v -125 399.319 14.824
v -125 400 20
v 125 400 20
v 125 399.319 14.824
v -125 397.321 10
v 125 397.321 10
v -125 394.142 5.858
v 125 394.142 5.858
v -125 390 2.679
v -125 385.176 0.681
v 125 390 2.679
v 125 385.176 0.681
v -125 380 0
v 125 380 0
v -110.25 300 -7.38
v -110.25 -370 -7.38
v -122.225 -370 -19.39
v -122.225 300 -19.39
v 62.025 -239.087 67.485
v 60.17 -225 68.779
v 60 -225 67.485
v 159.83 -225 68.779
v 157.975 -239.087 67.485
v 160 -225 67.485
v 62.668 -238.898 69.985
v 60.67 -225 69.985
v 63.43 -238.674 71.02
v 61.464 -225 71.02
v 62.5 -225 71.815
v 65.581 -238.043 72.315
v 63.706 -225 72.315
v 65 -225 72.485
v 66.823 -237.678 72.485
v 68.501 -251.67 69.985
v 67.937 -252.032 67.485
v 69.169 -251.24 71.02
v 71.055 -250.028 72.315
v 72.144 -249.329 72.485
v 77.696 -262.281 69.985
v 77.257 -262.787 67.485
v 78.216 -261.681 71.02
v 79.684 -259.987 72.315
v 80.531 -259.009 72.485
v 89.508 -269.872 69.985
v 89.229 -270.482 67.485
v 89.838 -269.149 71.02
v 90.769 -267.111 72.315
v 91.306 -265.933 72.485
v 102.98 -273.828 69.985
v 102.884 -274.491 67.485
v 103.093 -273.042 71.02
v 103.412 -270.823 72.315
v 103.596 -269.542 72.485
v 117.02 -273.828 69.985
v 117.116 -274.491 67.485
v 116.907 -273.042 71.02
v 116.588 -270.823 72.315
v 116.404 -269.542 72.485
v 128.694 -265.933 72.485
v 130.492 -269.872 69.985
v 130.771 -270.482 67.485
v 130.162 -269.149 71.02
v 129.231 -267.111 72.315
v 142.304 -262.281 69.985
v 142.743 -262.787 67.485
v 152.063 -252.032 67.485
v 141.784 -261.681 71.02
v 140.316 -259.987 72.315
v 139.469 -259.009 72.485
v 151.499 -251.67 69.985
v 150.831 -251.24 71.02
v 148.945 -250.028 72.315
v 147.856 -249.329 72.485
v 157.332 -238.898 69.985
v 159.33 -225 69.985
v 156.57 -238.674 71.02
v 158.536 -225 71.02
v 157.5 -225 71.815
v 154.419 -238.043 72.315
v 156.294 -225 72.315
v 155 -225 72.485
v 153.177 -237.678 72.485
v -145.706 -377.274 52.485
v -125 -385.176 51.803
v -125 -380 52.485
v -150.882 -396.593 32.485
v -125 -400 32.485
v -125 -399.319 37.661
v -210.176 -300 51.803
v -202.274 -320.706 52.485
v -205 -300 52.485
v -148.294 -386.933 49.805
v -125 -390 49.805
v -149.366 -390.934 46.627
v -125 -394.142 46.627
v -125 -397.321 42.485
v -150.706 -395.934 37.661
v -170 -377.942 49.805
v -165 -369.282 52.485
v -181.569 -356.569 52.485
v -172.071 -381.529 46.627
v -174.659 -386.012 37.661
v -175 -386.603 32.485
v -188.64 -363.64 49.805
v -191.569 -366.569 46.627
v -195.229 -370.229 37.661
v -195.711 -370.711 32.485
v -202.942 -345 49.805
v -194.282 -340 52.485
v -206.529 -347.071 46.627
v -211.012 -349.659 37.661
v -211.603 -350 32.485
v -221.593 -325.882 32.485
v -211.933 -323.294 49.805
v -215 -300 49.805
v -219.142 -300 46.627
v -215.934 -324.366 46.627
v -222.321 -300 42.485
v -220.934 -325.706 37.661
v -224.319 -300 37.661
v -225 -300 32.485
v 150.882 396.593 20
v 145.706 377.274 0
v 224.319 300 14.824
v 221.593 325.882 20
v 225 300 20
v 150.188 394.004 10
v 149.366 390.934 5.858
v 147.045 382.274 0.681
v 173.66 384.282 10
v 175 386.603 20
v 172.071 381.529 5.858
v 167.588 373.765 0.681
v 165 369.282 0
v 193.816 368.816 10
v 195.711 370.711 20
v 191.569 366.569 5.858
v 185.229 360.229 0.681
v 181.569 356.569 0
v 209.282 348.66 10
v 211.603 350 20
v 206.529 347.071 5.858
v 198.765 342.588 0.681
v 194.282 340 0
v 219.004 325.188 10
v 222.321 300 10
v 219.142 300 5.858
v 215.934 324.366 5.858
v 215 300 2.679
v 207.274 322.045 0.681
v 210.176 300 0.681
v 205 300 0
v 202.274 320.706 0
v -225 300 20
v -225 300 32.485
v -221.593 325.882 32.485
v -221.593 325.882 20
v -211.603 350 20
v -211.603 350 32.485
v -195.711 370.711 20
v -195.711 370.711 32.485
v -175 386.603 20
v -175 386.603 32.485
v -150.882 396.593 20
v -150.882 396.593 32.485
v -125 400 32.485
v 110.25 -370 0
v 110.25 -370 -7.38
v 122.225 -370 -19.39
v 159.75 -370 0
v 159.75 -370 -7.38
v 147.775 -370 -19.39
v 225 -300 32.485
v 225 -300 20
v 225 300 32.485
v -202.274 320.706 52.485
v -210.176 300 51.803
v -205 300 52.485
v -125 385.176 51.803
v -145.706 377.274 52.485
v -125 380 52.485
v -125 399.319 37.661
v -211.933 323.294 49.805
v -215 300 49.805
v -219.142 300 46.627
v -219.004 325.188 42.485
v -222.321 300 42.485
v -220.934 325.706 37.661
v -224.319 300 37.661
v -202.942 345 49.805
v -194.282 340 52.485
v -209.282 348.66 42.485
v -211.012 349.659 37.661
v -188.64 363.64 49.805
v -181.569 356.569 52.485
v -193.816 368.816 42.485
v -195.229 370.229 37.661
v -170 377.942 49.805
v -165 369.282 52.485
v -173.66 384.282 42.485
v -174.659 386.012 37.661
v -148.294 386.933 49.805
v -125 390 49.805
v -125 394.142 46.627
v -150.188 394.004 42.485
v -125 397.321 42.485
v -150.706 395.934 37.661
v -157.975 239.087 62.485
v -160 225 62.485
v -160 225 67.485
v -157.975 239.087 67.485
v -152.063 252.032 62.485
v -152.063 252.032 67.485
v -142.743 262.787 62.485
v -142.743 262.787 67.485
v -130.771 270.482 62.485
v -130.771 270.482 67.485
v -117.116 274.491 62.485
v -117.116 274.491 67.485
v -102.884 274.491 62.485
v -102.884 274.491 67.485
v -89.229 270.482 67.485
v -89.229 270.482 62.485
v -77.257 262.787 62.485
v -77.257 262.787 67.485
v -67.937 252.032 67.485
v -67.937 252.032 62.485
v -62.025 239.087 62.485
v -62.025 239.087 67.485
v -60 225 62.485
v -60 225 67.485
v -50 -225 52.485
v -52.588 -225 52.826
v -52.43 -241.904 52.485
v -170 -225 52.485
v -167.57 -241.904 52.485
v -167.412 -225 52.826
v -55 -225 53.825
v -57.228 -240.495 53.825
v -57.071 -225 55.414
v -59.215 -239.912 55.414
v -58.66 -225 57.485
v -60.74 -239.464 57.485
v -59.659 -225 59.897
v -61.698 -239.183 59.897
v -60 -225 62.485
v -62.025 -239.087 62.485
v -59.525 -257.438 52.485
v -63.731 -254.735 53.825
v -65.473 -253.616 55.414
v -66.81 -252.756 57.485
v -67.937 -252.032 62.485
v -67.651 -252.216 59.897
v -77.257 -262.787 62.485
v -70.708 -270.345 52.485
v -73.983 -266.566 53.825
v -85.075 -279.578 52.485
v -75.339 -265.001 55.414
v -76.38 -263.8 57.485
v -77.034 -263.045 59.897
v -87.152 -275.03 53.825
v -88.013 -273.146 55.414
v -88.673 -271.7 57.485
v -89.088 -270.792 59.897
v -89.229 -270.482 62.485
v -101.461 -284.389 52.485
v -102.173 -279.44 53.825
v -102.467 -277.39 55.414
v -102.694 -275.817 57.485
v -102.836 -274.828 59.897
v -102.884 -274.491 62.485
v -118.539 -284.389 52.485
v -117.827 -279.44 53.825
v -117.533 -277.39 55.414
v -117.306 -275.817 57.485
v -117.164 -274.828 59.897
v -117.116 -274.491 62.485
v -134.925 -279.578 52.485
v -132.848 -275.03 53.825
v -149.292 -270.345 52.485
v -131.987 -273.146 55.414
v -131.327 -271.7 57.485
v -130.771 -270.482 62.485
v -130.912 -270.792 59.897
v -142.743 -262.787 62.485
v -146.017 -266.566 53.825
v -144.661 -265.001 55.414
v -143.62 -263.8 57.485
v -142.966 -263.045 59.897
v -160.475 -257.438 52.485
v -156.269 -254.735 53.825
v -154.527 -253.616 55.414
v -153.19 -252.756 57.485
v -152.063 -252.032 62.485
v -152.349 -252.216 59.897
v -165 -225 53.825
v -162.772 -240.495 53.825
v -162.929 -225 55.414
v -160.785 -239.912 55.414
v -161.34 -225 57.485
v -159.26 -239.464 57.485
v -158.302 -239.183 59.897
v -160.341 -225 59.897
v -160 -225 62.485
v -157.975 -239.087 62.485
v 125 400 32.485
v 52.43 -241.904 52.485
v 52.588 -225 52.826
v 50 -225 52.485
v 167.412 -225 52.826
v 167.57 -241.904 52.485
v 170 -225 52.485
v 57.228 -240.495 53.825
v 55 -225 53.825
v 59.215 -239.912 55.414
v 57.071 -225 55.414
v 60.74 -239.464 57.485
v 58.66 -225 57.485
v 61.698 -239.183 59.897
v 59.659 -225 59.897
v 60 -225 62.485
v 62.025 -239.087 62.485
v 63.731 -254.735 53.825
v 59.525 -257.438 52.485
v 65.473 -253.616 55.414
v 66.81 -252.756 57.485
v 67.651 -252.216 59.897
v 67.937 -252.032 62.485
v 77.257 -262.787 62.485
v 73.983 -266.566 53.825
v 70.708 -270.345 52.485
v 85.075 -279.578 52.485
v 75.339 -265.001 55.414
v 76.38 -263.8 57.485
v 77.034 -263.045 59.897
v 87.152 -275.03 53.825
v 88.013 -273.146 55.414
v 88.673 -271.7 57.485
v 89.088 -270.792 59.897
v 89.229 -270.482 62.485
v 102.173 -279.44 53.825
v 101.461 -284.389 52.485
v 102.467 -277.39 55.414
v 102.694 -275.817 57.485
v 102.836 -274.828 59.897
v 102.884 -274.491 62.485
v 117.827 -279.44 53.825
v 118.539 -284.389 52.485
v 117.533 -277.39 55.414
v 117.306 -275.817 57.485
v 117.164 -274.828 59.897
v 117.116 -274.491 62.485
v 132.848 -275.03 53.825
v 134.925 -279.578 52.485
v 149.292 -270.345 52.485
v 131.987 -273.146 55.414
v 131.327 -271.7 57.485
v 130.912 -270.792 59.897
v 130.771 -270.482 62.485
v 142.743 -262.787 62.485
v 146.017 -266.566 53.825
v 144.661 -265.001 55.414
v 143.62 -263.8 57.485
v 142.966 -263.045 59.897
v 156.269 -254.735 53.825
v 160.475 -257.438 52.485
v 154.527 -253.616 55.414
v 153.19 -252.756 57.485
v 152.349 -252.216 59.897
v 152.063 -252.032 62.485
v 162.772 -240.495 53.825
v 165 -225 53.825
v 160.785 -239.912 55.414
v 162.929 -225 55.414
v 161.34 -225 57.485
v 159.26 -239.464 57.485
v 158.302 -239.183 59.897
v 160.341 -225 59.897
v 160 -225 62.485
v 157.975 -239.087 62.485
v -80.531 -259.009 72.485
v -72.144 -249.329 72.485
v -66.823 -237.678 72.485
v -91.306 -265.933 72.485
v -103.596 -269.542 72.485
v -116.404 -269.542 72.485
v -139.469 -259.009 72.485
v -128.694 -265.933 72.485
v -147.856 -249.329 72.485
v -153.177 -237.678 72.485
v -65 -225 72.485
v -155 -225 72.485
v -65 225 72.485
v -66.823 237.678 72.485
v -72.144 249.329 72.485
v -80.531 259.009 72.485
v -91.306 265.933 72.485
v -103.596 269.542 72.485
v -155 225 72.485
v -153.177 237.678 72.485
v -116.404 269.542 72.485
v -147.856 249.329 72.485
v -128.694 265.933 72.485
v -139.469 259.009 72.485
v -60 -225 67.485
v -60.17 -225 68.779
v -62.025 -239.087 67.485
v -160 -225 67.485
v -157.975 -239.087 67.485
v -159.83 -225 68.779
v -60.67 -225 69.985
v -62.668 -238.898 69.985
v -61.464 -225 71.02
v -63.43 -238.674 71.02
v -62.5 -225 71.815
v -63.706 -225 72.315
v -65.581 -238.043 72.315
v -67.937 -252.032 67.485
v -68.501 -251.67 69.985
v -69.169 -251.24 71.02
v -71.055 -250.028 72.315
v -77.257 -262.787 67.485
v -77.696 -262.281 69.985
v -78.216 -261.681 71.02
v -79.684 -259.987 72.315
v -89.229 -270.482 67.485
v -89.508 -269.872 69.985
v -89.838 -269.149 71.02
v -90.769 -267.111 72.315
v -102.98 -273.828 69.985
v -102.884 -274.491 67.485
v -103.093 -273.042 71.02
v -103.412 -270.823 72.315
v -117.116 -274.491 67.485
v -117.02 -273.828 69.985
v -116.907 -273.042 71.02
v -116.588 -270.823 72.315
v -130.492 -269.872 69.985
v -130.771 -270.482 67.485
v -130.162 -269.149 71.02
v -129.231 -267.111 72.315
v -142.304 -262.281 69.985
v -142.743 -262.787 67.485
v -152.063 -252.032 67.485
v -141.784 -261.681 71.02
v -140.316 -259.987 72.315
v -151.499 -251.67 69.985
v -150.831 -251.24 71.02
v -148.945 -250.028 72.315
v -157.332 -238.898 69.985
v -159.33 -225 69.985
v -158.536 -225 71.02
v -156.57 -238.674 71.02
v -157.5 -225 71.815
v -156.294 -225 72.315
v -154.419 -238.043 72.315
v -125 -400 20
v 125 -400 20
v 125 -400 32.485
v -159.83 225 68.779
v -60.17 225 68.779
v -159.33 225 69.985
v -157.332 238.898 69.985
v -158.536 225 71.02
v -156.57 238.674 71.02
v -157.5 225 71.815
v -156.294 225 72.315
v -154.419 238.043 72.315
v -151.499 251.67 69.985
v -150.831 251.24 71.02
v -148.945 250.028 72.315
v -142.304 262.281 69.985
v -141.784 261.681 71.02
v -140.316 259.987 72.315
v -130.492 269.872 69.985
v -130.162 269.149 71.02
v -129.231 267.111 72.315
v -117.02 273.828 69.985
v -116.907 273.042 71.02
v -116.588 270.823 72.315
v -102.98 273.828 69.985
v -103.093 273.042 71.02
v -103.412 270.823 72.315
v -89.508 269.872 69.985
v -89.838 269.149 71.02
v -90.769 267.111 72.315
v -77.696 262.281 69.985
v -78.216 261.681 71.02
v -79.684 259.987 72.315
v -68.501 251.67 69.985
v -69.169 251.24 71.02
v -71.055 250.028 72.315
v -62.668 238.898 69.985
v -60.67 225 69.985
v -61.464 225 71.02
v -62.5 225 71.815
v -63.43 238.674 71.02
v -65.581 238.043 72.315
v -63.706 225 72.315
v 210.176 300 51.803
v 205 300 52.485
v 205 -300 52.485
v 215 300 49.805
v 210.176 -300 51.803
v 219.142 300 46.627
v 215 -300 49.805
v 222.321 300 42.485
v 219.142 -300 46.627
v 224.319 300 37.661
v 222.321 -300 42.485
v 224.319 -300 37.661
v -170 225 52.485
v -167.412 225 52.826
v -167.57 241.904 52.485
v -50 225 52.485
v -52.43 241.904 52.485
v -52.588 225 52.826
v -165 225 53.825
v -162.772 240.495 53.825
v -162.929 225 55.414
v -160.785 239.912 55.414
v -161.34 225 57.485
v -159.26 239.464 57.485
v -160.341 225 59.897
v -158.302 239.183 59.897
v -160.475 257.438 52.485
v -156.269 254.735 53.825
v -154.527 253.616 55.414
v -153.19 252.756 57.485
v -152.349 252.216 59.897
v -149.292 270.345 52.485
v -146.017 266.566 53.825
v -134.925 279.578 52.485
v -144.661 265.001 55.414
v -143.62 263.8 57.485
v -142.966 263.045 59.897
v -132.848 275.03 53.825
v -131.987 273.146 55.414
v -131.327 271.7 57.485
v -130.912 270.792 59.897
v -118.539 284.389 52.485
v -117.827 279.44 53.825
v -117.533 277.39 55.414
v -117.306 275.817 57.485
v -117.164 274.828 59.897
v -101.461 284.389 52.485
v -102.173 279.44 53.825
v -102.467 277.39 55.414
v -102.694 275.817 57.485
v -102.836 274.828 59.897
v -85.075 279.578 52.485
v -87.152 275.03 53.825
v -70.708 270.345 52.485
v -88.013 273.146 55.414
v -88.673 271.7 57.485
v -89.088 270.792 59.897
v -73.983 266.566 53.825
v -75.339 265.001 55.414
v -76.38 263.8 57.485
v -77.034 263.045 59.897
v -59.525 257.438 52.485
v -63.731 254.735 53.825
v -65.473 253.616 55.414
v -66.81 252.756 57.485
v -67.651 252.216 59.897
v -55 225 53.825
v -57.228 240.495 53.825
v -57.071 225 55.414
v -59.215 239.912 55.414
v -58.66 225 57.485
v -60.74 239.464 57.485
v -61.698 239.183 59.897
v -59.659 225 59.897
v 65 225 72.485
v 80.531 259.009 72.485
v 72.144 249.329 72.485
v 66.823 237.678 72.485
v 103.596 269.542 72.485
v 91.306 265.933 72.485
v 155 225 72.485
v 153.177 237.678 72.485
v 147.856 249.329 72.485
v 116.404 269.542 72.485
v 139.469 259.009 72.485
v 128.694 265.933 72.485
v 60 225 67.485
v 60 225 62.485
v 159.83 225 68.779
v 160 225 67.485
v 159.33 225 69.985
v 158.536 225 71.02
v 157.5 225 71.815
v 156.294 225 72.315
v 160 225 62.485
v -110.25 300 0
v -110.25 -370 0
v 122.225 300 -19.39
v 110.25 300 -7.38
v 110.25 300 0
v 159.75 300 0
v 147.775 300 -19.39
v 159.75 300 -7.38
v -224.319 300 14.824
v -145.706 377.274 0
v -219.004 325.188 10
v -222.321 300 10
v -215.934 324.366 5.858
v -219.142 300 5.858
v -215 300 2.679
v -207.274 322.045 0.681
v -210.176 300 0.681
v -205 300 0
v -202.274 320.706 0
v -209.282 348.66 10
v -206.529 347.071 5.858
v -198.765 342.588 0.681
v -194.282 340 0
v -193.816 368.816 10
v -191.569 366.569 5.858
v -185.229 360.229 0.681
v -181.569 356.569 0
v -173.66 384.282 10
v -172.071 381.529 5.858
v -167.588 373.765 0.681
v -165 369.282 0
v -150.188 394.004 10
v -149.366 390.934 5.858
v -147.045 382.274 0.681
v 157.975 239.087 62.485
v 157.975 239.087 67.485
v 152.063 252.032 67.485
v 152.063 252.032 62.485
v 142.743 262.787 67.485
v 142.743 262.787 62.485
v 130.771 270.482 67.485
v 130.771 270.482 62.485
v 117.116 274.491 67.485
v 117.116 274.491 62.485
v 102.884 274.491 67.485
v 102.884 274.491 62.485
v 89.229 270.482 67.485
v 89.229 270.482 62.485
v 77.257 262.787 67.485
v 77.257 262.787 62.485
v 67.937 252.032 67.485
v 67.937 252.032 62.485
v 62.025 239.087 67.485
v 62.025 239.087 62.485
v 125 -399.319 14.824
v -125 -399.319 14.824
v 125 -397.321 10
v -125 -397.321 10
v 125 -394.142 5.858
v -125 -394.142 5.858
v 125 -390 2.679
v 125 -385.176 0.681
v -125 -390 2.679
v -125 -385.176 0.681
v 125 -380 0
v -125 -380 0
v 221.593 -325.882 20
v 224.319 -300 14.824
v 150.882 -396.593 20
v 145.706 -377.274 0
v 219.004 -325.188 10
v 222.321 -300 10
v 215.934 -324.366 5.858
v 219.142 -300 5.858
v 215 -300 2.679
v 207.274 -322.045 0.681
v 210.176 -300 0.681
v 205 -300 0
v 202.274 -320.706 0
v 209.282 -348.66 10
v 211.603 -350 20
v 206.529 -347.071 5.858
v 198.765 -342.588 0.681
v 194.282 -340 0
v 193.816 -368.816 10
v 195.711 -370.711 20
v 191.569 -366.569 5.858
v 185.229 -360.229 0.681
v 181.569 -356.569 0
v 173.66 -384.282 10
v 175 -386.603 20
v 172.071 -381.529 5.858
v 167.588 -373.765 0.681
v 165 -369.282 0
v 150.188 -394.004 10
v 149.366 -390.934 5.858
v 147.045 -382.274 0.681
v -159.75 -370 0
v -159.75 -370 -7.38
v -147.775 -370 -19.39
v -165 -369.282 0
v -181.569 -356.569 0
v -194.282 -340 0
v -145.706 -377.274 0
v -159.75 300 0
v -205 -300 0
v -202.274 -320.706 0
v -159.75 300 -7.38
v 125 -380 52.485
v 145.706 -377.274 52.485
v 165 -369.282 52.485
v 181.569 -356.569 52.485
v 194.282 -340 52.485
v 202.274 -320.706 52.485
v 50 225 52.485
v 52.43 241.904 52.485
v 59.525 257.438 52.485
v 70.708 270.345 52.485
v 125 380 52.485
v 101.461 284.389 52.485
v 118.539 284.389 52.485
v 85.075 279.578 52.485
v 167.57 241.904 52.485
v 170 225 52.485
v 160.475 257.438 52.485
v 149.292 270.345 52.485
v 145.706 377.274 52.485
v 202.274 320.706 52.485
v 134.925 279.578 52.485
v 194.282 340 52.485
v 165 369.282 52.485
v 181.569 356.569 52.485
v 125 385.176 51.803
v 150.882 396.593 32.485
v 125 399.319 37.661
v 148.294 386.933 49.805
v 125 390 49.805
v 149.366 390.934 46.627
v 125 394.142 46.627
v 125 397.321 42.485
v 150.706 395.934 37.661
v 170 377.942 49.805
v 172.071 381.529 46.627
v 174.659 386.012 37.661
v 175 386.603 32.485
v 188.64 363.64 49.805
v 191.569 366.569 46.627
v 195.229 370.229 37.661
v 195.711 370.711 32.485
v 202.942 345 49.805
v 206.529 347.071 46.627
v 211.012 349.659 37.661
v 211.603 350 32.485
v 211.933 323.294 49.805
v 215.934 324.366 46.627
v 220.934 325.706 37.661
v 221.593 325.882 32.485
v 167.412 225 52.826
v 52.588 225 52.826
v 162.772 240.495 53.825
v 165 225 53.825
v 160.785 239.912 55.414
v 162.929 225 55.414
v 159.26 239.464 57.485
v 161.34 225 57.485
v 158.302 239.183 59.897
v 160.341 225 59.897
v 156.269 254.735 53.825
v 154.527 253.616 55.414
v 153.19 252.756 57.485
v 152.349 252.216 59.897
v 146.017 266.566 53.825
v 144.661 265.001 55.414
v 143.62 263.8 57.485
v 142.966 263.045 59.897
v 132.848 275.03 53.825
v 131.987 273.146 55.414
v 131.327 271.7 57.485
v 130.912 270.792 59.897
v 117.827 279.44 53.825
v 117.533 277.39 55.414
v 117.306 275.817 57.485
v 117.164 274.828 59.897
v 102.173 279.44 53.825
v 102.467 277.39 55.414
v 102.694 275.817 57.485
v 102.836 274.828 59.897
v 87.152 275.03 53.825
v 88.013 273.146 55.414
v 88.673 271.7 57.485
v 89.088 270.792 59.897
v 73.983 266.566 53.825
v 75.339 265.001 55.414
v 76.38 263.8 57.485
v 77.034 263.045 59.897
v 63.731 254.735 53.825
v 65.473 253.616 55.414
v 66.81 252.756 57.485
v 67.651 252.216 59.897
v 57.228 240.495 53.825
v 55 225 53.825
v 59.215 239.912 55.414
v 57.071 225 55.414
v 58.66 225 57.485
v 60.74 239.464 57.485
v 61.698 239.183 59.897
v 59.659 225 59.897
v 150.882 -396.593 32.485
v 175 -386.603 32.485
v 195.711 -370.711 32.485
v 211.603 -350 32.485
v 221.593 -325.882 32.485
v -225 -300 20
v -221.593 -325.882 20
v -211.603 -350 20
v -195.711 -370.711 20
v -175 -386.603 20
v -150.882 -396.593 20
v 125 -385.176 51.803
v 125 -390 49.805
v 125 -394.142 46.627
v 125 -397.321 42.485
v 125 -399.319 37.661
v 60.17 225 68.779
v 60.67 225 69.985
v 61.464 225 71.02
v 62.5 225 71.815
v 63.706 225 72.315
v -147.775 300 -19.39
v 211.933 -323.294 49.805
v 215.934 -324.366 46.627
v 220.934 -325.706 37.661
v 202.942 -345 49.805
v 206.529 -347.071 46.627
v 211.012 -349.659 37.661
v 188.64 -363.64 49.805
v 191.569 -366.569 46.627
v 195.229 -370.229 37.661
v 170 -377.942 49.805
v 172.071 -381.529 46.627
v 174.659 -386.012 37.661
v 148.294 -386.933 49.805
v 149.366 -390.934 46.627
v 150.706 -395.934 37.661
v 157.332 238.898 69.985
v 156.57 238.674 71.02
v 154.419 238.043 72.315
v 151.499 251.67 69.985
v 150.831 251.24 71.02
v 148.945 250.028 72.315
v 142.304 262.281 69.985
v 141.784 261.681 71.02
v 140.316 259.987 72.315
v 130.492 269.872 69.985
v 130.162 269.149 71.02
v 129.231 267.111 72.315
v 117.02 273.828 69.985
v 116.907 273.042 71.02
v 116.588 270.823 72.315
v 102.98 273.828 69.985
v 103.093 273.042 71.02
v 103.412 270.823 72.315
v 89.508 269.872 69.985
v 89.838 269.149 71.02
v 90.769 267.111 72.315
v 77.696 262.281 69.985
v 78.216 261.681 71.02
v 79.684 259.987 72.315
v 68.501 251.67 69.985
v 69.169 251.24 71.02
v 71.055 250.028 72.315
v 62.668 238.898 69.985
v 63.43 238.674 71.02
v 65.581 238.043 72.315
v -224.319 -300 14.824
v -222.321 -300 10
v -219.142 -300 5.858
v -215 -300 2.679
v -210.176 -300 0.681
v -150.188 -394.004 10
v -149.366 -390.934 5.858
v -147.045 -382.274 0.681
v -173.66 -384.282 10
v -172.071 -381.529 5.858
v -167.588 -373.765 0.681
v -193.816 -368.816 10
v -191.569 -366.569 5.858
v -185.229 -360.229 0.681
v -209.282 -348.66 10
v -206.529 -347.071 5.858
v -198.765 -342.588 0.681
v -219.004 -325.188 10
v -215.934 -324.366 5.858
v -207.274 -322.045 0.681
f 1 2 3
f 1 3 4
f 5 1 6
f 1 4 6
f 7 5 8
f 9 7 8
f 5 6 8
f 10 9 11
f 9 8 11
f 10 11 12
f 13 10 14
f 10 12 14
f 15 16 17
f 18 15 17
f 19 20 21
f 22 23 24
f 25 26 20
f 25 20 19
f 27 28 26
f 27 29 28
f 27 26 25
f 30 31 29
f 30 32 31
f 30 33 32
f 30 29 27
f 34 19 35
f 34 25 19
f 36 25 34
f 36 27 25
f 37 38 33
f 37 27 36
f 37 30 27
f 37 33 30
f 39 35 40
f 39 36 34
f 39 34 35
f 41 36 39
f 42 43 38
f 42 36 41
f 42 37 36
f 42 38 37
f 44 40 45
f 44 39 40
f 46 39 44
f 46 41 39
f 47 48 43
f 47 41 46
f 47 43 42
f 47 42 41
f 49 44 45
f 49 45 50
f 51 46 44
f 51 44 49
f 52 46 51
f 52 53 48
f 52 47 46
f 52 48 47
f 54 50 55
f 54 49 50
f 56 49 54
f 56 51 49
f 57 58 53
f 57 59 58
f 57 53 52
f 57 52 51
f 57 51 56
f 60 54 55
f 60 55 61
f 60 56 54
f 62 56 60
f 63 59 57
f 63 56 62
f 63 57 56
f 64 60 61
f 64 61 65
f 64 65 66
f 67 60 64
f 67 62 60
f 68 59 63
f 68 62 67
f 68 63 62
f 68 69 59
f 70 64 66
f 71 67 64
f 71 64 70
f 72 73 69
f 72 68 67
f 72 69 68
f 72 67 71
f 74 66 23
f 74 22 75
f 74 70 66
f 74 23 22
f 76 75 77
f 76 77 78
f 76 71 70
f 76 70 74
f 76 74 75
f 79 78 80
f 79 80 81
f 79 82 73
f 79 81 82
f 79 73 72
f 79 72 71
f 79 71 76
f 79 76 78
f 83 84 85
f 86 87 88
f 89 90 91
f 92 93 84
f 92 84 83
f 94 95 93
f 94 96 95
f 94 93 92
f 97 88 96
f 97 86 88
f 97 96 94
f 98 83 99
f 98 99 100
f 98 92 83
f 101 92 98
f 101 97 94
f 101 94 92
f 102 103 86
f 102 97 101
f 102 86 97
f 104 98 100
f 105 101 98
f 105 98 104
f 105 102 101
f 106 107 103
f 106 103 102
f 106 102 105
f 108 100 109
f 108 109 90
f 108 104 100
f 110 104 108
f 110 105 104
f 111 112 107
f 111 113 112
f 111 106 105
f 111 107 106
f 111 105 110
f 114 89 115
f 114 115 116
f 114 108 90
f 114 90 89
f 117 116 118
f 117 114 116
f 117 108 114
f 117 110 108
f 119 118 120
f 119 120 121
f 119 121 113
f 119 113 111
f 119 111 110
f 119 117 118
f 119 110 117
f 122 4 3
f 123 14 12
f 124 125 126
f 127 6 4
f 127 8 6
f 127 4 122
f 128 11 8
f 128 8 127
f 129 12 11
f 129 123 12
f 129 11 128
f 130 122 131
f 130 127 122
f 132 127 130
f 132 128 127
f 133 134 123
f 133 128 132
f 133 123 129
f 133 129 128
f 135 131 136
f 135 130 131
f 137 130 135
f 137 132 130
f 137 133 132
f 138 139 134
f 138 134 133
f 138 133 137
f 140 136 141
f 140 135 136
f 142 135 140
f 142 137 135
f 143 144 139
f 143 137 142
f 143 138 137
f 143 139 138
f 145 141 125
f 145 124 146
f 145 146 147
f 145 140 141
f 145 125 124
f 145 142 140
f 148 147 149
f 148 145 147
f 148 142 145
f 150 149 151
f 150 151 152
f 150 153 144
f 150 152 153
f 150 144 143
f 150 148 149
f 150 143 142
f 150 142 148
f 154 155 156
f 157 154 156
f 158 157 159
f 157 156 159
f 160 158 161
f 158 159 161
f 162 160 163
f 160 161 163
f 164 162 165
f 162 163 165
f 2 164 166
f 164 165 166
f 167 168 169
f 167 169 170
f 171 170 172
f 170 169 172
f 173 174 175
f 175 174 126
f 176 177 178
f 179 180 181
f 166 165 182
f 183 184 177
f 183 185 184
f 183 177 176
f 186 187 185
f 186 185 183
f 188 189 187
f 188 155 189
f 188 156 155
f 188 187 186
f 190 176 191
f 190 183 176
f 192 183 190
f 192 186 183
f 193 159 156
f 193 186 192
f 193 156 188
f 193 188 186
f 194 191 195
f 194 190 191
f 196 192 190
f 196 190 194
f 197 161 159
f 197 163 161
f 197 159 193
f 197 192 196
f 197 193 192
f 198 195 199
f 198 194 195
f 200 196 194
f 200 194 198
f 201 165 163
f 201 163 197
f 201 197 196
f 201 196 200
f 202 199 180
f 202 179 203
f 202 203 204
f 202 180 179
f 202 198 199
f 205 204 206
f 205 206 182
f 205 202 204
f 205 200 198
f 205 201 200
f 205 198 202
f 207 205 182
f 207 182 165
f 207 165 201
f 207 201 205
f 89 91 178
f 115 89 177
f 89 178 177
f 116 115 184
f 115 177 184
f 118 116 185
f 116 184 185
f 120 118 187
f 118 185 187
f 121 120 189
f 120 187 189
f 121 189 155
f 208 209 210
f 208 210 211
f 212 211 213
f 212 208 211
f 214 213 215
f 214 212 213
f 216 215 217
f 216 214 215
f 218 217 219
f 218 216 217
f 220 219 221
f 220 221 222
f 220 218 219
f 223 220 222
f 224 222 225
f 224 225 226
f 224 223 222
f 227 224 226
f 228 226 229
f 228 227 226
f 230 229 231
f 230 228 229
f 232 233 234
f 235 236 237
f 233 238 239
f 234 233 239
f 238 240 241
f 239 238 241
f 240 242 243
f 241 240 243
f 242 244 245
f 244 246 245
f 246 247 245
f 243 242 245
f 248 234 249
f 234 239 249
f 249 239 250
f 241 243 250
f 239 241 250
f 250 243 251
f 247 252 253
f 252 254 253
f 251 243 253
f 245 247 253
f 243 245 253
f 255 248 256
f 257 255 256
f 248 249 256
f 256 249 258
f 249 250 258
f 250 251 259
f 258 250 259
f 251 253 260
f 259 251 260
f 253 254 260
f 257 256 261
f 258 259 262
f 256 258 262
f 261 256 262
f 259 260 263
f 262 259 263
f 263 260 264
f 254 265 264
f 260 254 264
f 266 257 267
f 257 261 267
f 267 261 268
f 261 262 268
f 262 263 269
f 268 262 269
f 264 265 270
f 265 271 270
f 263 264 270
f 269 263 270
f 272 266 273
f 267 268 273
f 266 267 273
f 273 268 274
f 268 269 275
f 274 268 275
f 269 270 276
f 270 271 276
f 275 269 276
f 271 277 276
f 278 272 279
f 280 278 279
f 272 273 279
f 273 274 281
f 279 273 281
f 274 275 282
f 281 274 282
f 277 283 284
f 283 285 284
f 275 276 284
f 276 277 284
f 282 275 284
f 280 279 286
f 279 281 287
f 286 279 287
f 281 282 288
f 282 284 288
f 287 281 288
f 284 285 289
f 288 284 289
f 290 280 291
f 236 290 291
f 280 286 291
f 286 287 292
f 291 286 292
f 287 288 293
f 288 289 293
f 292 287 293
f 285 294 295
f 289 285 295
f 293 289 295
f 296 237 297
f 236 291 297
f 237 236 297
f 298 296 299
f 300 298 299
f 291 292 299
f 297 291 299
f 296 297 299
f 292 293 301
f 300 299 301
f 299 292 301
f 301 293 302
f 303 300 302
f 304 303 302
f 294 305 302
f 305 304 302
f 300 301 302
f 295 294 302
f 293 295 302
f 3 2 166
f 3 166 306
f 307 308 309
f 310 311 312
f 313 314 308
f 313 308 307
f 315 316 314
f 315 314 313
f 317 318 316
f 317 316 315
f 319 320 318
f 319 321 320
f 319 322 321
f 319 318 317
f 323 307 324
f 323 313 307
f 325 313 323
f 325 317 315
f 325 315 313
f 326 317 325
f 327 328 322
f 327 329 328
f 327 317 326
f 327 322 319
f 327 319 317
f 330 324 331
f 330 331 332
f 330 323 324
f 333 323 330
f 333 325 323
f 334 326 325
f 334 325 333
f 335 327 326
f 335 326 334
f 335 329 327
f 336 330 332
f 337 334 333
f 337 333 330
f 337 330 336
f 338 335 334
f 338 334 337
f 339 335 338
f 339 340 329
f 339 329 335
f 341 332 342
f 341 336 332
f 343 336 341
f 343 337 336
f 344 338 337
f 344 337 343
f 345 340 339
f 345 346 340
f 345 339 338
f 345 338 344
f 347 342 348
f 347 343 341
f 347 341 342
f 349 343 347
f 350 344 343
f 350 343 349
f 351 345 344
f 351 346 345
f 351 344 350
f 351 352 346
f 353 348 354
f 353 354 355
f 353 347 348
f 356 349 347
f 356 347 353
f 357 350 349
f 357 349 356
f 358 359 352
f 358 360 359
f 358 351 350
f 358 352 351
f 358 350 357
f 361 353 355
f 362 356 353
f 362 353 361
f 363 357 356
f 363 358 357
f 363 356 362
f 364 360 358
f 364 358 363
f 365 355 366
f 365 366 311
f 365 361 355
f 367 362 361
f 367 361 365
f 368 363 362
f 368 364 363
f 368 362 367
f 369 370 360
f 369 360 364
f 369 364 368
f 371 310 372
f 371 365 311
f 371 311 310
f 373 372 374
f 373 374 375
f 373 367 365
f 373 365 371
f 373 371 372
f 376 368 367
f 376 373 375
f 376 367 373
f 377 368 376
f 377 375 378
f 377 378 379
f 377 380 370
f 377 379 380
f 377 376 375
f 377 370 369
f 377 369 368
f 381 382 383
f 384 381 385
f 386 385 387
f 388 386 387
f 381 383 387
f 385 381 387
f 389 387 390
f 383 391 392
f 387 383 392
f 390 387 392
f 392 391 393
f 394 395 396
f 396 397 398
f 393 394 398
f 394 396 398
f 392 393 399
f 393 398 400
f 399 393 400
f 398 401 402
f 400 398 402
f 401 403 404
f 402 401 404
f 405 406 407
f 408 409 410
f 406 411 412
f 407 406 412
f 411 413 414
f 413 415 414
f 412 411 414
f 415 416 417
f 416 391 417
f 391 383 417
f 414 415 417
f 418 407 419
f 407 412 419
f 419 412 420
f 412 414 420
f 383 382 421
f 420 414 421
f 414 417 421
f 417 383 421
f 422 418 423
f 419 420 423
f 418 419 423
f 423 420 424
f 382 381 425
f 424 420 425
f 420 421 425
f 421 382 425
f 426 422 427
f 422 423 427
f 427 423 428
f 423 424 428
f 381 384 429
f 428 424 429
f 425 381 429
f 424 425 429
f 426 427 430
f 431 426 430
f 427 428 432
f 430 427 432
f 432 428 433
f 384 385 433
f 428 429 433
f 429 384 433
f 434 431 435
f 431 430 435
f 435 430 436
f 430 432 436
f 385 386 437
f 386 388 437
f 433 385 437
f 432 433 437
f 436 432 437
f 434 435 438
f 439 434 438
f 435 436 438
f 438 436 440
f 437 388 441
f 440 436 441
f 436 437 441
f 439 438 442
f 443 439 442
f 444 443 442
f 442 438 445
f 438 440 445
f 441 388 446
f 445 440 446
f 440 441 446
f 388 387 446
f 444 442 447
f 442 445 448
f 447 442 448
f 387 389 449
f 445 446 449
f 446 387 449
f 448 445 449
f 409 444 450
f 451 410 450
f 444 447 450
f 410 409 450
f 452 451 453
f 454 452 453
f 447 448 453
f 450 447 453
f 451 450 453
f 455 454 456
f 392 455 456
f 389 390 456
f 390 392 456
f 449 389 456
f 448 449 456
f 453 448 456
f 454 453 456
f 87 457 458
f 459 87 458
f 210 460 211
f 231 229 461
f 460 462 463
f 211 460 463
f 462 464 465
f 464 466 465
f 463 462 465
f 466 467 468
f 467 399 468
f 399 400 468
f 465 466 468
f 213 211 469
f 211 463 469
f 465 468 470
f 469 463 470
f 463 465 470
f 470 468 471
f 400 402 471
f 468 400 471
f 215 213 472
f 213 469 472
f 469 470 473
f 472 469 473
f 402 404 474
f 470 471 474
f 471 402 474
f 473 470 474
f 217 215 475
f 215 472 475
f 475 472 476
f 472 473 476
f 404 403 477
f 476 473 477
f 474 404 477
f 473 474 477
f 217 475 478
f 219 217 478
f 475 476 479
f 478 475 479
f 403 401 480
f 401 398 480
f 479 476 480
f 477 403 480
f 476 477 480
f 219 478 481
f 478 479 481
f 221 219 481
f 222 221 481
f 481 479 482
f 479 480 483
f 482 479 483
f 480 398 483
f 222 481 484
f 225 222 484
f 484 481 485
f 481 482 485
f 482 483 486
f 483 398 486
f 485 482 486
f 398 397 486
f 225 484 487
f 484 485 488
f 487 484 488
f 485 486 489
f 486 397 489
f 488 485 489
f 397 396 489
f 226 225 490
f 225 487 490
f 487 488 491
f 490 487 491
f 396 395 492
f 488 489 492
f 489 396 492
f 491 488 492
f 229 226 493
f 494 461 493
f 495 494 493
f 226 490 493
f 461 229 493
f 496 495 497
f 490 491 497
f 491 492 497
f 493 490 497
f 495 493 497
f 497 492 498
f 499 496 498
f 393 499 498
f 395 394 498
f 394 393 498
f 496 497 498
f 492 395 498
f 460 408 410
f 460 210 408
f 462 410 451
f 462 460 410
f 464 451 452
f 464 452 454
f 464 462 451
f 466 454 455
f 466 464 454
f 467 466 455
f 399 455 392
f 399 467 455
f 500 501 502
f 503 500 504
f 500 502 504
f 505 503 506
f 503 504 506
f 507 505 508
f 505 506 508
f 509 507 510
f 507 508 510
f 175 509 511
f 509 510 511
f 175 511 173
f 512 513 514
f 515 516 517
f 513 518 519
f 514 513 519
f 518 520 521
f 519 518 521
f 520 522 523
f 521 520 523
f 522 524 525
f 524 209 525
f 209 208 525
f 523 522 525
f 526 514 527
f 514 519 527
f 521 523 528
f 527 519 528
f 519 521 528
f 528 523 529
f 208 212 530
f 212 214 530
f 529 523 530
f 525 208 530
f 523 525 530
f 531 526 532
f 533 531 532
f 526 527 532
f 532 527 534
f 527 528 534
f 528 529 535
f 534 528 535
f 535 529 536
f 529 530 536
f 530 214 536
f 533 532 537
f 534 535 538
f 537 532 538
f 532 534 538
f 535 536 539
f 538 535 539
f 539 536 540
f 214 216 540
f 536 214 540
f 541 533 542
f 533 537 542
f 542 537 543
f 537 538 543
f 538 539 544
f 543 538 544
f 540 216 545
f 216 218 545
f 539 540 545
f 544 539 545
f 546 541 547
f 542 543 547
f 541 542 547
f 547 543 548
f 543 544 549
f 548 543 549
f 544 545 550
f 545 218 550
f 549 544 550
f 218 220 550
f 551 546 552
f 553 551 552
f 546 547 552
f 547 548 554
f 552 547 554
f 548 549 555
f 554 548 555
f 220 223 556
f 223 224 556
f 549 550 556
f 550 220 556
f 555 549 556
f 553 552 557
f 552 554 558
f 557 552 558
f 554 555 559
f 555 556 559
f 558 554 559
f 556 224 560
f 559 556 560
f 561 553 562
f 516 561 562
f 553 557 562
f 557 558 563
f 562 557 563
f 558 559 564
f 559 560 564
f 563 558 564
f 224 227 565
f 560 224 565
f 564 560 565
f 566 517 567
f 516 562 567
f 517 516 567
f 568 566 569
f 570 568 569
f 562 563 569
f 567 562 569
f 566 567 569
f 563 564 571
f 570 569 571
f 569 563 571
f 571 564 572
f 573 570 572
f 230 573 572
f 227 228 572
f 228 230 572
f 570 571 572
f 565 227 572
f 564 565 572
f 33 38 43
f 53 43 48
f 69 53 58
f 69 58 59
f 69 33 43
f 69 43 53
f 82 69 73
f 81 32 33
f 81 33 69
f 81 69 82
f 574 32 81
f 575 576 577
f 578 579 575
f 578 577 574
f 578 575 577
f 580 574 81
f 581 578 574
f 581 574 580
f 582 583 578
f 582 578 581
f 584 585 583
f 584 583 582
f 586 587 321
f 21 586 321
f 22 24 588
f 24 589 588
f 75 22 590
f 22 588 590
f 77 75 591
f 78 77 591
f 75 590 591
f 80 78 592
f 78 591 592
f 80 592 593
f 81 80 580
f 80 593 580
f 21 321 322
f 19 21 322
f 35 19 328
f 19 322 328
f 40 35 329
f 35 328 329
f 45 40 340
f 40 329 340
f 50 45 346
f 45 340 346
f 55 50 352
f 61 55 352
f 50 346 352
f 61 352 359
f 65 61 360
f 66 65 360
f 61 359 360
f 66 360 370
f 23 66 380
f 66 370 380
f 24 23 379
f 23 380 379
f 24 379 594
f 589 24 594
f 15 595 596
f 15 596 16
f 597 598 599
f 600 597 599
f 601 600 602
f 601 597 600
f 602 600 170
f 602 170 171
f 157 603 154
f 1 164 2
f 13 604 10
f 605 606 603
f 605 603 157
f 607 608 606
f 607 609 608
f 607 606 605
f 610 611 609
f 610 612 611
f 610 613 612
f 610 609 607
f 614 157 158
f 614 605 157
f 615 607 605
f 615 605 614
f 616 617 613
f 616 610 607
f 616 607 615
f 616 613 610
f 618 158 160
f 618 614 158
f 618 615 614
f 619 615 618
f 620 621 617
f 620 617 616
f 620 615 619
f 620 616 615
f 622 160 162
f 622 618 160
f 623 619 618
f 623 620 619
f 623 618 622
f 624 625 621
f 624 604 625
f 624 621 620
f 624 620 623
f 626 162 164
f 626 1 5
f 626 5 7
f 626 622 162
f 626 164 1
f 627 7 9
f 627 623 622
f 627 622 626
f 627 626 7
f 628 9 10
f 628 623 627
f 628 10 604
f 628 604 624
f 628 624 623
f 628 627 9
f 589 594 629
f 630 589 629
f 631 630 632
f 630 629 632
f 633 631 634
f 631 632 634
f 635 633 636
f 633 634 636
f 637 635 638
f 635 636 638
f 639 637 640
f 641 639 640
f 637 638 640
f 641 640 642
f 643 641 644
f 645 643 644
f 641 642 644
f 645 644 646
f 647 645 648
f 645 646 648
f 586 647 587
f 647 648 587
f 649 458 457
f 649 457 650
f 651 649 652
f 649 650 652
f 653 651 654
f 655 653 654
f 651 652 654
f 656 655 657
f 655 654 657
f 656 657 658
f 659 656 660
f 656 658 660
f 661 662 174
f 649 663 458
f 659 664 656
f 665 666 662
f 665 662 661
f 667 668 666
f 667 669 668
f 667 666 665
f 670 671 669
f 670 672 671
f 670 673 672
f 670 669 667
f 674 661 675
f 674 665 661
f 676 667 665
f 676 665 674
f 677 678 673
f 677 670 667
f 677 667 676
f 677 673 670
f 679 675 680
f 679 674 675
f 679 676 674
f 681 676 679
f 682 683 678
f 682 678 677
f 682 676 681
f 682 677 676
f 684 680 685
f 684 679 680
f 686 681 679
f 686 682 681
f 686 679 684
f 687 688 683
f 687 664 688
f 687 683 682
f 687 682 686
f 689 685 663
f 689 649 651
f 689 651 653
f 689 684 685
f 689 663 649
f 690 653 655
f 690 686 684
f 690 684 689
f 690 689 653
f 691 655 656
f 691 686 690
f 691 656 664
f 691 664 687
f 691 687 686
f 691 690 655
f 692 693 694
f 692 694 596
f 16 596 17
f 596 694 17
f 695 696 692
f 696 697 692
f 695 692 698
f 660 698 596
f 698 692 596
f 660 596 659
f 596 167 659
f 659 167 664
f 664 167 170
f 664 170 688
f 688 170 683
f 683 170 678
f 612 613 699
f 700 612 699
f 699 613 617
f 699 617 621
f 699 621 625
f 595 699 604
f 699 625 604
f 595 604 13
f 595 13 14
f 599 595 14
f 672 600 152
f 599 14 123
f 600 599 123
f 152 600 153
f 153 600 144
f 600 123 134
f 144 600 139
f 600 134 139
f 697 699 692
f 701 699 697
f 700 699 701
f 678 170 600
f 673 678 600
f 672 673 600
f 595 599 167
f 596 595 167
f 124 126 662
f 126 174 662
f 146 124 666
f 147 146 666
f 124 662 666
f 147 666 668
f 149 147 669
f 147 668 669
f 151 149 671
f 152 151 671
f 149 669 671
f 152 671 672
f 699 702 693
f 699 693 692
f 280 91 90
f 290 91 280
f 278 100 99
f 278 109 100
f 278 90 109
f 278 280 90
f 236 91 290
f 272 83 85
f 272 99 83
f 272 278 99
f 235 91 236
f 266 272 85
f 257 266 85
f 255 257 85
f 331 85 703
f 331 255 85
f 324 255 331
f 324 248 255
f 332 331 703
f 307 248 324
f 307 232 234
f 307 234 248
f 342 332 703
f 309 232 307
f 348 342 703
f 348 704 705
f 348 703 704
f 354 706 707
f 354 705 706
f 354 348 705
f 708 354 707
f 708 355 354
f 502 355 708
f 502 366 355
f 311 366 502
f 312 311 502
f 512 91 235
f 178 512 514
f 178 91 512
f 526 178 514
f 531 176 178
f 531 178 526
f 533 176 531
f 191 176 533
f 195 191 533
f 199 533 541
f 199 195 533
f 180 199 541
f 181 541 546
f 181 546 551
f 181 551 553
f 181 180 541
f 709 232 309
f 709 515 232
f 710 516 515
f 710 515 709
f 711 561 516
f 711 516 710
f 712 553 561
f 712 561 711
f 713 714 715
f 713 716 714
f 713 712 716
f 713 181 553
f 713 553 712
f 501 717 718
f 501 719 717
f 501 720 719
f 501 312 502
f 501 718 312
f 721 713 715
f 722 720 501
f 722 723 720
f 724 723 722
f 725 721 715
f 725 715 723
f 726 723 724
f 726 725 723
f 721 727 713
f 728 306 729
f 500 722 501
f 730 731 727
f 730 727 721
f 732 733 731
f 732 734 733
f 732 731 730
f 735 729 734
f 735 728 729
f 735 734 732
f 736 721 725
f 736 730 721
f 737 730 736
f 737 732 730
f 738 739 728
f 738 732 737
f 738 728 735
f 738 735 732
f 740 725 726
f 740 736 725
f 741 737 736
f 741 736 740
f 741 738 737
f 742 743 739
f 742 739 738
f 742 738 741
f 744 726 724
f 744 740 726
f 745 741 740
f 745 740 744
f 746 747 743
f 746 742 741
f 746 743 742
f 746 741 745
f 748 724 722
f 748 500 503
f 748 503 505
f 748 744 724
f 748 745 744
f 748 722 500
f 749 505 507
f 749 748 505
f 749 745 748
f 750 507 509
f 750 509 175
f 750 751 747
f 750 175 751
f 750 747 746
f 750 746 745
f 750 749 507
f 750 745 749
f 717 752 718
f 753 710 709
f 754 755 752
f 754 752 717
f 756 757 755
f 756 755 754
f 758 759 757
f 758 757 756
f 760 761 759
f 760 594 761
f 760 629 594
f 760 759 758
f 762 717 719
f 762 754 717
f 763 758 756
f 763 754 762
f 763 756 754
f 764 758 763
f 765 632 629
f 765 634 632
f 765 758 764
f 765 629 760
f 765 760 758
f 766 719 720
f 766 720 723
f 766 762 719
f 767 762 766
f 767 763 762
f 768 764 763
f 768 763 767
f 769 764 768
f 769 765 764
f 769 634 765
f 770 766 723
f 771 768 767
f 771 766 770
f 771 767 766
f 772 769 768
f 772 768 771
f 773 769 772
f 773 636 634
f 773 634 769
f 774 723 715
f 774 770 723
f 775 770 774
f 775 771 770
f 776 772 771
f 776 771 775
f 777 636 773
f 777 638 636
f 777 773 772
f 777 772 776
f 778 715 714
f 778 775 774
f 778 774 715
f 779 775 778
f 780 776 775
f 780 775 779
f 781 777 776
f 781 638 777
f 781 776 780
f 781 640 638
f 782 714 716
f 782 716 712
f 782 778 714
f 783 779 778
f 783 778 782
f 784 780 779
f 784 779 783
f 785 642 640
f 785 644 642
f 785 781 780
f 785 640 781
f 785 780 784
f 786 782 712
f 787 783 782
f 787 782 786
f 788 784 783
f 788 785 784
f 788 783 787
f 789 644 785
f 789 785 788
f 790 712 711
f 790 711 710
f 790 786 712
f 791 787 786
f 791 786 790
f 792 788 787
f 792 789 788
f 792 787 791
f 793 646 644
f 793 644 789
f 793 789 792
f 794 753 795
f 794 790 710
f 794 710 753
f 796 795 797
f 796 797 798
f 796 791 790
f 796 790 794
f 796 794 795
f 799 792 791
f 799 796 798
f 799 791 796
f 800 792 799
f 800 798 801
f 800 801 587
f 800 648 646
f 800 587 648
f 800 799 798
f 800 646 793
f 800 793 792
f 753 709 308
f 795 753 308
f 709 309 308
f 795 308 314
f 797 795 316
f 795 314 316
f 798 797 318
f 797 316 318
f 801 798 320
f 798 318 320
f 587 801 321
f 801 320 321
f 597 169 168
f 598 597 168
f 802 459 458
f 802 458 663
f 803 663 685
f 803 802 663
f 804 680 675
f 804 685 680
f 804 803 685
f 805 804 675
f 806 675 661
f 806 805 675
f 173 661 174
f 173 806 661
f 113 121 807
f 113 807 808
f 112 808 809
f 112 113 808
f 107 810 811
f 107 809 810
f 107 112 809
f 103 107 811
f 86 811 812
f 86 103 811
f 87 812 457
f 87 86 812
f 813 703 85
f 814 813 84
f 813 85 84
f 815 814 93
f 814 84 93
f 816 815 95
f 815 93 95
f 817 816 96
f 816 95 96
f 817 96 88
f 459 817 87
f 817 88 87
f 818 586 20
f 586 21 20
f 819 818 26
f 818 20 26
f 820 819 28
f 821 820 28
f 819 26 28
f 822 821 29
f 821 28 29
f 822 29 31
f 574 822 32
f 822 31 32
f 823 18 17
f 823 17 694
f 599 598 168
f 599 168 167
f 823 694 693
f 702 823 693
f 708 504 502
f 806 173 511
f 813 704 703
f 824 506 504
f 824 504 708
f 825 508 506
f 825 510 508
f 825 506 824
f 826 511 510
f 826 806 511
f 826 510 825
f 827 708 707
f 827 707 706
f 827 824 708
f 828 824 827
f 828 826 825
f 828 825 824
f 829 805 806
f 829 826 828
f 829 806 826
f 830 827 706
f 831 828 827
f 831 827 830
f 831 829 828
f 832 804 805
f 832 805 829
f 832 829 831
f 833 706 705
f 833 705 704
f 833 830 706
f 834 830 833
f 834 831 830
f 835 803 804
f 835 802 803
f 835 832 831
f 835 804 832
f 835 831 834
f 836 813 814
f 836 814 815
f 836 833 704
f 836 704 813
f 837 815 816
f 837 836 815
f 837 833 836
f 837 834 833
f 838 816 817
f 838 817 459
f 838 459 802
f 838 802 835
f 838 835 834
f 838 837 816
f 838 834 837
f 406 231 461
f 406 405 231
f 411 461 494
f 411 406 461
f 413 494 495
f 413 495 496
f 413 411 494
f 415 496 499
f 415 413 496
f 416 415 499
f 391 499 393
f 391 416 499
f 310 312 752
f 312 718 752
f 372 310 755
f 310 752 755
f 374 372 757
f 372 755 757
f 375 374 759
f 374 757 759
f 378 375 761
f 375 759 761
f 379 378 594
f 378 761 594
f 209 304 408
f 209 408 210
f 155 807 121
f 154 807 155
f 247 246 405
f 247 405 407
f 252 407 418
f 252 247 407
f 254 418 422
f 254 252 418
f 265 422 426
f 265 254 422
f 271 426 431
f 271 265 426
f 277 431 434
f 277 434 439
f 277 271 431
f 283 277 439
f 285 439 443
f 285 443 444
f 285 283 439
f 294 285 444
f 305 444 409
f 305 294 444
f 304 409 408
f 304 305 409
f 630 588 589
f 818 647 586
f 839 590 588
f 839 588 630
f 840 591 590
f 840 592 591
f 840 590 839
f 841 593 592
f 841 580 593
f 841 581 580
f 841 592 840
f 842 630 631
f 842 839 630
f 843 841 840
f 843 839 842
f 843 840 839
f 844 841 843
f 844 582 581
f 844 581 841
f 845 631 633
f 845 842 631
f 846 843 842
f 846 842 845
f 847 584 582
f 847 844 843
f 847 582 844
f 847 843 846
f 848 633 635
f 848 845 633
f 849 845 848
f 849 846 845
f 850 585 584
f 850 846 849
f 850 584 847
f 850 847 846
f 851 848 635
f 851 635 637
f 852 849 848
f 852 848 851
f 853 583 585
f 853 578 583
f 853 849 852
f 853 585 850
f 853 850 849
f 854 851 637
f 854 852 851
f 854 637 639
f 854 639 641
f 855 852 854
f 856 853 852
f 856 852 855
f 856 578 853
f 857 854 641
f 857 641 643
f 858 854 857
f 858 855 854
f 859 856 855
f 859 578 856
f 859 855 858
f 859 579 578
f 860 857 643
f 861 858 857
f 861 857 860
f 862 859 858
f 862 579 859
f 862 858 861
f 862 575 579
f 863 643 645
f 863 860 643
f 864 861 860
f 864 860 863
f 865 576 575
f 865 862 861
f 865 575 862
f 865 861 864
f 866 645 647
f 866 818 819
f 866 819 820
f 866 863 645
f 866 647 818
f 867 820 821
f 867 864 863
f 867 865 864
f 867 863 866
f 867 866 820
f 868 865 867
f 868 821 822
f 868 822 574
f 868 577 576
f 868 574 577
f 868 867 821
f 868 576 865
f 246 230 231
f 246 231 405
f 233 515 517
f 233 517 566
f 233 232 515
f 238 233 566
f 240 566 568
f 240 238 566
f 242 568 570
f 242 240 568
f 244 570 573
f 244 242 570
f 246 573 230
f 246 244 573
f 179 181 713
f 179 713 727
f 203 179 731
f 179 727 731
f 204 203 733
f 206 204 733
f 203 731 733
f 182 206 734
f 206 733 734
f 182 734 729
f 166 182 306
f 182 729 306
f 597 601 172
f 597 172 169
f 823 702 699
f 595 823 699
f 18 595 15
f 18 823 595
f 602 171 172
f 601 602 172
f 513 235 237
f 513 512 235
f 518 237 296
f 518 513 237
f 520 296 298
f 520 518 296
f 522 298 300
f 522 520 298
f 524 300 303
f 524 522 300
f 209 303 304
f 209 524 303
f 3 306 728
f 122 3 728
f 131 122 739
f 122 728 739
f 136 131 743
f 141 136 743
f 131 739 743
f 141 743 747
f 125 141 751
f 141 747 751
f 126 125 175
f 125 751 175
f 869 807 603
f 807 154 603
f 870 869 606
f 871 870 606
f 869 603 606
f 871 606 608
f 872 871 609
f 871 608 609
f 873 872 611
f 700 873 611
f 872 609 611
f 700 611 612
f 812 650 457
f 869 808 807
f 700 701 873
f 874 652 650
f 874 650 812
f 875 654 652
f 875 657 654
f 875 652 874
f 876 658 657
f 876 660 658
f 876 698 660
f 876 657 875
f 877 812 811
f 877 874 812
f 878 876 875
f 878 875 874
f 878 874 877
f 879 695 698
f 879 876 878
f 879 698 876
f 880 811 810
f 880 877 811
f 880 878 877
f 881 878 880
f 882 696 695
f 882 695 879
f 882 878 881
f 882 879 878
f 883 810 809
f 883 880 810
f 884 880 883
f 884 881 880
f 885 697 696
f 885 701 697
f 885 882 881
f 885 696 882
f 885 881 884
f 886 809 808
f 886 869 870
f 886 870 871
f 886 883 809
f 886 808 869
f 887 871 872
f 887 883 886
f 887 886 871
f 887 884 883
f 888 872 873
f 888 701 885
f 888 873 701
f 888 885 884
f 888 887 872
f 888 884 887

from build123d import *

# Parameters (mm, degrees)
SKETCH_1_W      = 450
SKETCH_1_H      = 800
EXTRUDE_1_DEPTH = 52.484908593
EXTRUDE_2_DEPTH = 20
FILLET_1_R      = 100
FILLET_2_R      = 10
FILLET_3_R      = 5
FILLET_4_R      = 20
EXTRUDE_START   = -100
EXTRUDE_3_DEPTH = 670


with BuildPart() as part:
    # 草图1 → 凸台-拉伸1 (new body)
    with BuildSketch(Plane.XY):
        Rectangle(SKETCH_1_W, SKETCH_1_H)
    extrude(amount=EXTRUDE_1_DEPTH)

    # 草图2 → 凸台-拉伸2 (add)
    with BuildSketch(Plane.XY.offset(52.484908593)):
        with BuildLine():
            Line((-60, 225), (-60, -225))
            ThreePointArc((-60, -225), (-110, -275), (-160, -225))
            Line((-160, -225), (-160, 225))
            ThreePointArc((-160, 225), (-110, 275), (-60, 225))
        make_face()
        with BuildLine():
            Line((60, 225), (60, -225))
            ThreePointArc((60, -225), (110, -275), (160, -225))
            Line((160, -225), (160, 225))
            ThreePointArc((160, 225), (110, 275), (60, 225))
        make_face()
    extrude(amount=EXTRUDE_2_DEPTH)

    # 圆角1
    fillet_1_edges = [part.edges().sort_by_distance(p)[0] for p in [
        (225, -400, 26.242454296),
        (-225, -400, 26.242454296),
        (-225, 400, 26.242454296),
        (225, 400, 26.242454296),
    ]]
    fillet(fillet_1_edges, radius=FILLET_1_R)

    # 圆角2
    fillet_2_edges = [part.edges().sort_by_distance(p)[0] for p in [
        (-110, 275, 52.484908593),
        (-160, 0, 52.484908593),
        (-110, -275, 52.484908593),
        (-60, 0, 52.484908593),
        (110, 275, 52.484908593),
        (60, 0, 52.484908593),
        (110, -275, 52.484908593),
        (160, 0, 52.484908593),
    ]]
    fillet(fillet_2_edges, radius=FILLET_2_R)

    # 圆角3
    fillet_3_edges = [part.edges().sort_by_distance(p)[0] for p in [
        (-110, 275, 72.484908593),
        (-160, 0, 72.484908593),
        (-110, -275, 72.484908593),
        (-60, 0, 72.484908593),
        (110, 275, 72.484908593),
        (60, 0, 72.484908593),
        (110, -275, 72.484908593),
        (160, 0, 72.484908593),
    ]]
    fillet(fillet_3_edges, radius=FILLET_3_R)

    # 圆角4
    fillet_4_edges = [part.edges().sort_by_distance(p)[0] for p in [
        (0, 400, 0),
        (0, 400, 52.484908593),
        (225, 0, 0),
        (0, -400, 0),
        (-225, 0, 0),
        (-195.710678119, -370.710678119, 0),
        (195.710678119, -370.710678119, 0),
        (-195.710678119, 370.710678119, 0),
        (195.710678119, 370.710678119, 0),
        (225, 0, 52.484908593),
        (-225, 0, 52.484908593),
        (0, -400, 52.484908593),
        (-195.710678119, -370.710678119, 52.484908593),
        (195.710678119, -370.710678119, 52.484908593),
        (-195.710678119, 370.710678119, 52.484908593),
        (195.710678119, 370.710678119, 52.484908593),
    ]]
    fillet(fillet_4_edges, radius=FILLET_4_R)

    # 草图3 → 凸台-拉伸3 (add)
    with BuildSketch(Plane(origin=(0, 400, 0), x_dir=(1, 0, 0), z_dir=(0, 1, 0)).offset(EXTRUDE_START)):
        Polygon((-159.75, 0), (-110.25, 0), (-110.25, 7.38), (-122.225, 19.39), (-147.775, 19.39), (-159.75, 7.38), align=None)
        Polygon((159.75, 0), (159.75, 7.38), (147.775, 19.39), (122.225, 19.39), (110.25, 7.38), (110.25, 0), align=None)
    extrude(amount=-EXTRUDE_3_DEPTH)


solid = part.part
